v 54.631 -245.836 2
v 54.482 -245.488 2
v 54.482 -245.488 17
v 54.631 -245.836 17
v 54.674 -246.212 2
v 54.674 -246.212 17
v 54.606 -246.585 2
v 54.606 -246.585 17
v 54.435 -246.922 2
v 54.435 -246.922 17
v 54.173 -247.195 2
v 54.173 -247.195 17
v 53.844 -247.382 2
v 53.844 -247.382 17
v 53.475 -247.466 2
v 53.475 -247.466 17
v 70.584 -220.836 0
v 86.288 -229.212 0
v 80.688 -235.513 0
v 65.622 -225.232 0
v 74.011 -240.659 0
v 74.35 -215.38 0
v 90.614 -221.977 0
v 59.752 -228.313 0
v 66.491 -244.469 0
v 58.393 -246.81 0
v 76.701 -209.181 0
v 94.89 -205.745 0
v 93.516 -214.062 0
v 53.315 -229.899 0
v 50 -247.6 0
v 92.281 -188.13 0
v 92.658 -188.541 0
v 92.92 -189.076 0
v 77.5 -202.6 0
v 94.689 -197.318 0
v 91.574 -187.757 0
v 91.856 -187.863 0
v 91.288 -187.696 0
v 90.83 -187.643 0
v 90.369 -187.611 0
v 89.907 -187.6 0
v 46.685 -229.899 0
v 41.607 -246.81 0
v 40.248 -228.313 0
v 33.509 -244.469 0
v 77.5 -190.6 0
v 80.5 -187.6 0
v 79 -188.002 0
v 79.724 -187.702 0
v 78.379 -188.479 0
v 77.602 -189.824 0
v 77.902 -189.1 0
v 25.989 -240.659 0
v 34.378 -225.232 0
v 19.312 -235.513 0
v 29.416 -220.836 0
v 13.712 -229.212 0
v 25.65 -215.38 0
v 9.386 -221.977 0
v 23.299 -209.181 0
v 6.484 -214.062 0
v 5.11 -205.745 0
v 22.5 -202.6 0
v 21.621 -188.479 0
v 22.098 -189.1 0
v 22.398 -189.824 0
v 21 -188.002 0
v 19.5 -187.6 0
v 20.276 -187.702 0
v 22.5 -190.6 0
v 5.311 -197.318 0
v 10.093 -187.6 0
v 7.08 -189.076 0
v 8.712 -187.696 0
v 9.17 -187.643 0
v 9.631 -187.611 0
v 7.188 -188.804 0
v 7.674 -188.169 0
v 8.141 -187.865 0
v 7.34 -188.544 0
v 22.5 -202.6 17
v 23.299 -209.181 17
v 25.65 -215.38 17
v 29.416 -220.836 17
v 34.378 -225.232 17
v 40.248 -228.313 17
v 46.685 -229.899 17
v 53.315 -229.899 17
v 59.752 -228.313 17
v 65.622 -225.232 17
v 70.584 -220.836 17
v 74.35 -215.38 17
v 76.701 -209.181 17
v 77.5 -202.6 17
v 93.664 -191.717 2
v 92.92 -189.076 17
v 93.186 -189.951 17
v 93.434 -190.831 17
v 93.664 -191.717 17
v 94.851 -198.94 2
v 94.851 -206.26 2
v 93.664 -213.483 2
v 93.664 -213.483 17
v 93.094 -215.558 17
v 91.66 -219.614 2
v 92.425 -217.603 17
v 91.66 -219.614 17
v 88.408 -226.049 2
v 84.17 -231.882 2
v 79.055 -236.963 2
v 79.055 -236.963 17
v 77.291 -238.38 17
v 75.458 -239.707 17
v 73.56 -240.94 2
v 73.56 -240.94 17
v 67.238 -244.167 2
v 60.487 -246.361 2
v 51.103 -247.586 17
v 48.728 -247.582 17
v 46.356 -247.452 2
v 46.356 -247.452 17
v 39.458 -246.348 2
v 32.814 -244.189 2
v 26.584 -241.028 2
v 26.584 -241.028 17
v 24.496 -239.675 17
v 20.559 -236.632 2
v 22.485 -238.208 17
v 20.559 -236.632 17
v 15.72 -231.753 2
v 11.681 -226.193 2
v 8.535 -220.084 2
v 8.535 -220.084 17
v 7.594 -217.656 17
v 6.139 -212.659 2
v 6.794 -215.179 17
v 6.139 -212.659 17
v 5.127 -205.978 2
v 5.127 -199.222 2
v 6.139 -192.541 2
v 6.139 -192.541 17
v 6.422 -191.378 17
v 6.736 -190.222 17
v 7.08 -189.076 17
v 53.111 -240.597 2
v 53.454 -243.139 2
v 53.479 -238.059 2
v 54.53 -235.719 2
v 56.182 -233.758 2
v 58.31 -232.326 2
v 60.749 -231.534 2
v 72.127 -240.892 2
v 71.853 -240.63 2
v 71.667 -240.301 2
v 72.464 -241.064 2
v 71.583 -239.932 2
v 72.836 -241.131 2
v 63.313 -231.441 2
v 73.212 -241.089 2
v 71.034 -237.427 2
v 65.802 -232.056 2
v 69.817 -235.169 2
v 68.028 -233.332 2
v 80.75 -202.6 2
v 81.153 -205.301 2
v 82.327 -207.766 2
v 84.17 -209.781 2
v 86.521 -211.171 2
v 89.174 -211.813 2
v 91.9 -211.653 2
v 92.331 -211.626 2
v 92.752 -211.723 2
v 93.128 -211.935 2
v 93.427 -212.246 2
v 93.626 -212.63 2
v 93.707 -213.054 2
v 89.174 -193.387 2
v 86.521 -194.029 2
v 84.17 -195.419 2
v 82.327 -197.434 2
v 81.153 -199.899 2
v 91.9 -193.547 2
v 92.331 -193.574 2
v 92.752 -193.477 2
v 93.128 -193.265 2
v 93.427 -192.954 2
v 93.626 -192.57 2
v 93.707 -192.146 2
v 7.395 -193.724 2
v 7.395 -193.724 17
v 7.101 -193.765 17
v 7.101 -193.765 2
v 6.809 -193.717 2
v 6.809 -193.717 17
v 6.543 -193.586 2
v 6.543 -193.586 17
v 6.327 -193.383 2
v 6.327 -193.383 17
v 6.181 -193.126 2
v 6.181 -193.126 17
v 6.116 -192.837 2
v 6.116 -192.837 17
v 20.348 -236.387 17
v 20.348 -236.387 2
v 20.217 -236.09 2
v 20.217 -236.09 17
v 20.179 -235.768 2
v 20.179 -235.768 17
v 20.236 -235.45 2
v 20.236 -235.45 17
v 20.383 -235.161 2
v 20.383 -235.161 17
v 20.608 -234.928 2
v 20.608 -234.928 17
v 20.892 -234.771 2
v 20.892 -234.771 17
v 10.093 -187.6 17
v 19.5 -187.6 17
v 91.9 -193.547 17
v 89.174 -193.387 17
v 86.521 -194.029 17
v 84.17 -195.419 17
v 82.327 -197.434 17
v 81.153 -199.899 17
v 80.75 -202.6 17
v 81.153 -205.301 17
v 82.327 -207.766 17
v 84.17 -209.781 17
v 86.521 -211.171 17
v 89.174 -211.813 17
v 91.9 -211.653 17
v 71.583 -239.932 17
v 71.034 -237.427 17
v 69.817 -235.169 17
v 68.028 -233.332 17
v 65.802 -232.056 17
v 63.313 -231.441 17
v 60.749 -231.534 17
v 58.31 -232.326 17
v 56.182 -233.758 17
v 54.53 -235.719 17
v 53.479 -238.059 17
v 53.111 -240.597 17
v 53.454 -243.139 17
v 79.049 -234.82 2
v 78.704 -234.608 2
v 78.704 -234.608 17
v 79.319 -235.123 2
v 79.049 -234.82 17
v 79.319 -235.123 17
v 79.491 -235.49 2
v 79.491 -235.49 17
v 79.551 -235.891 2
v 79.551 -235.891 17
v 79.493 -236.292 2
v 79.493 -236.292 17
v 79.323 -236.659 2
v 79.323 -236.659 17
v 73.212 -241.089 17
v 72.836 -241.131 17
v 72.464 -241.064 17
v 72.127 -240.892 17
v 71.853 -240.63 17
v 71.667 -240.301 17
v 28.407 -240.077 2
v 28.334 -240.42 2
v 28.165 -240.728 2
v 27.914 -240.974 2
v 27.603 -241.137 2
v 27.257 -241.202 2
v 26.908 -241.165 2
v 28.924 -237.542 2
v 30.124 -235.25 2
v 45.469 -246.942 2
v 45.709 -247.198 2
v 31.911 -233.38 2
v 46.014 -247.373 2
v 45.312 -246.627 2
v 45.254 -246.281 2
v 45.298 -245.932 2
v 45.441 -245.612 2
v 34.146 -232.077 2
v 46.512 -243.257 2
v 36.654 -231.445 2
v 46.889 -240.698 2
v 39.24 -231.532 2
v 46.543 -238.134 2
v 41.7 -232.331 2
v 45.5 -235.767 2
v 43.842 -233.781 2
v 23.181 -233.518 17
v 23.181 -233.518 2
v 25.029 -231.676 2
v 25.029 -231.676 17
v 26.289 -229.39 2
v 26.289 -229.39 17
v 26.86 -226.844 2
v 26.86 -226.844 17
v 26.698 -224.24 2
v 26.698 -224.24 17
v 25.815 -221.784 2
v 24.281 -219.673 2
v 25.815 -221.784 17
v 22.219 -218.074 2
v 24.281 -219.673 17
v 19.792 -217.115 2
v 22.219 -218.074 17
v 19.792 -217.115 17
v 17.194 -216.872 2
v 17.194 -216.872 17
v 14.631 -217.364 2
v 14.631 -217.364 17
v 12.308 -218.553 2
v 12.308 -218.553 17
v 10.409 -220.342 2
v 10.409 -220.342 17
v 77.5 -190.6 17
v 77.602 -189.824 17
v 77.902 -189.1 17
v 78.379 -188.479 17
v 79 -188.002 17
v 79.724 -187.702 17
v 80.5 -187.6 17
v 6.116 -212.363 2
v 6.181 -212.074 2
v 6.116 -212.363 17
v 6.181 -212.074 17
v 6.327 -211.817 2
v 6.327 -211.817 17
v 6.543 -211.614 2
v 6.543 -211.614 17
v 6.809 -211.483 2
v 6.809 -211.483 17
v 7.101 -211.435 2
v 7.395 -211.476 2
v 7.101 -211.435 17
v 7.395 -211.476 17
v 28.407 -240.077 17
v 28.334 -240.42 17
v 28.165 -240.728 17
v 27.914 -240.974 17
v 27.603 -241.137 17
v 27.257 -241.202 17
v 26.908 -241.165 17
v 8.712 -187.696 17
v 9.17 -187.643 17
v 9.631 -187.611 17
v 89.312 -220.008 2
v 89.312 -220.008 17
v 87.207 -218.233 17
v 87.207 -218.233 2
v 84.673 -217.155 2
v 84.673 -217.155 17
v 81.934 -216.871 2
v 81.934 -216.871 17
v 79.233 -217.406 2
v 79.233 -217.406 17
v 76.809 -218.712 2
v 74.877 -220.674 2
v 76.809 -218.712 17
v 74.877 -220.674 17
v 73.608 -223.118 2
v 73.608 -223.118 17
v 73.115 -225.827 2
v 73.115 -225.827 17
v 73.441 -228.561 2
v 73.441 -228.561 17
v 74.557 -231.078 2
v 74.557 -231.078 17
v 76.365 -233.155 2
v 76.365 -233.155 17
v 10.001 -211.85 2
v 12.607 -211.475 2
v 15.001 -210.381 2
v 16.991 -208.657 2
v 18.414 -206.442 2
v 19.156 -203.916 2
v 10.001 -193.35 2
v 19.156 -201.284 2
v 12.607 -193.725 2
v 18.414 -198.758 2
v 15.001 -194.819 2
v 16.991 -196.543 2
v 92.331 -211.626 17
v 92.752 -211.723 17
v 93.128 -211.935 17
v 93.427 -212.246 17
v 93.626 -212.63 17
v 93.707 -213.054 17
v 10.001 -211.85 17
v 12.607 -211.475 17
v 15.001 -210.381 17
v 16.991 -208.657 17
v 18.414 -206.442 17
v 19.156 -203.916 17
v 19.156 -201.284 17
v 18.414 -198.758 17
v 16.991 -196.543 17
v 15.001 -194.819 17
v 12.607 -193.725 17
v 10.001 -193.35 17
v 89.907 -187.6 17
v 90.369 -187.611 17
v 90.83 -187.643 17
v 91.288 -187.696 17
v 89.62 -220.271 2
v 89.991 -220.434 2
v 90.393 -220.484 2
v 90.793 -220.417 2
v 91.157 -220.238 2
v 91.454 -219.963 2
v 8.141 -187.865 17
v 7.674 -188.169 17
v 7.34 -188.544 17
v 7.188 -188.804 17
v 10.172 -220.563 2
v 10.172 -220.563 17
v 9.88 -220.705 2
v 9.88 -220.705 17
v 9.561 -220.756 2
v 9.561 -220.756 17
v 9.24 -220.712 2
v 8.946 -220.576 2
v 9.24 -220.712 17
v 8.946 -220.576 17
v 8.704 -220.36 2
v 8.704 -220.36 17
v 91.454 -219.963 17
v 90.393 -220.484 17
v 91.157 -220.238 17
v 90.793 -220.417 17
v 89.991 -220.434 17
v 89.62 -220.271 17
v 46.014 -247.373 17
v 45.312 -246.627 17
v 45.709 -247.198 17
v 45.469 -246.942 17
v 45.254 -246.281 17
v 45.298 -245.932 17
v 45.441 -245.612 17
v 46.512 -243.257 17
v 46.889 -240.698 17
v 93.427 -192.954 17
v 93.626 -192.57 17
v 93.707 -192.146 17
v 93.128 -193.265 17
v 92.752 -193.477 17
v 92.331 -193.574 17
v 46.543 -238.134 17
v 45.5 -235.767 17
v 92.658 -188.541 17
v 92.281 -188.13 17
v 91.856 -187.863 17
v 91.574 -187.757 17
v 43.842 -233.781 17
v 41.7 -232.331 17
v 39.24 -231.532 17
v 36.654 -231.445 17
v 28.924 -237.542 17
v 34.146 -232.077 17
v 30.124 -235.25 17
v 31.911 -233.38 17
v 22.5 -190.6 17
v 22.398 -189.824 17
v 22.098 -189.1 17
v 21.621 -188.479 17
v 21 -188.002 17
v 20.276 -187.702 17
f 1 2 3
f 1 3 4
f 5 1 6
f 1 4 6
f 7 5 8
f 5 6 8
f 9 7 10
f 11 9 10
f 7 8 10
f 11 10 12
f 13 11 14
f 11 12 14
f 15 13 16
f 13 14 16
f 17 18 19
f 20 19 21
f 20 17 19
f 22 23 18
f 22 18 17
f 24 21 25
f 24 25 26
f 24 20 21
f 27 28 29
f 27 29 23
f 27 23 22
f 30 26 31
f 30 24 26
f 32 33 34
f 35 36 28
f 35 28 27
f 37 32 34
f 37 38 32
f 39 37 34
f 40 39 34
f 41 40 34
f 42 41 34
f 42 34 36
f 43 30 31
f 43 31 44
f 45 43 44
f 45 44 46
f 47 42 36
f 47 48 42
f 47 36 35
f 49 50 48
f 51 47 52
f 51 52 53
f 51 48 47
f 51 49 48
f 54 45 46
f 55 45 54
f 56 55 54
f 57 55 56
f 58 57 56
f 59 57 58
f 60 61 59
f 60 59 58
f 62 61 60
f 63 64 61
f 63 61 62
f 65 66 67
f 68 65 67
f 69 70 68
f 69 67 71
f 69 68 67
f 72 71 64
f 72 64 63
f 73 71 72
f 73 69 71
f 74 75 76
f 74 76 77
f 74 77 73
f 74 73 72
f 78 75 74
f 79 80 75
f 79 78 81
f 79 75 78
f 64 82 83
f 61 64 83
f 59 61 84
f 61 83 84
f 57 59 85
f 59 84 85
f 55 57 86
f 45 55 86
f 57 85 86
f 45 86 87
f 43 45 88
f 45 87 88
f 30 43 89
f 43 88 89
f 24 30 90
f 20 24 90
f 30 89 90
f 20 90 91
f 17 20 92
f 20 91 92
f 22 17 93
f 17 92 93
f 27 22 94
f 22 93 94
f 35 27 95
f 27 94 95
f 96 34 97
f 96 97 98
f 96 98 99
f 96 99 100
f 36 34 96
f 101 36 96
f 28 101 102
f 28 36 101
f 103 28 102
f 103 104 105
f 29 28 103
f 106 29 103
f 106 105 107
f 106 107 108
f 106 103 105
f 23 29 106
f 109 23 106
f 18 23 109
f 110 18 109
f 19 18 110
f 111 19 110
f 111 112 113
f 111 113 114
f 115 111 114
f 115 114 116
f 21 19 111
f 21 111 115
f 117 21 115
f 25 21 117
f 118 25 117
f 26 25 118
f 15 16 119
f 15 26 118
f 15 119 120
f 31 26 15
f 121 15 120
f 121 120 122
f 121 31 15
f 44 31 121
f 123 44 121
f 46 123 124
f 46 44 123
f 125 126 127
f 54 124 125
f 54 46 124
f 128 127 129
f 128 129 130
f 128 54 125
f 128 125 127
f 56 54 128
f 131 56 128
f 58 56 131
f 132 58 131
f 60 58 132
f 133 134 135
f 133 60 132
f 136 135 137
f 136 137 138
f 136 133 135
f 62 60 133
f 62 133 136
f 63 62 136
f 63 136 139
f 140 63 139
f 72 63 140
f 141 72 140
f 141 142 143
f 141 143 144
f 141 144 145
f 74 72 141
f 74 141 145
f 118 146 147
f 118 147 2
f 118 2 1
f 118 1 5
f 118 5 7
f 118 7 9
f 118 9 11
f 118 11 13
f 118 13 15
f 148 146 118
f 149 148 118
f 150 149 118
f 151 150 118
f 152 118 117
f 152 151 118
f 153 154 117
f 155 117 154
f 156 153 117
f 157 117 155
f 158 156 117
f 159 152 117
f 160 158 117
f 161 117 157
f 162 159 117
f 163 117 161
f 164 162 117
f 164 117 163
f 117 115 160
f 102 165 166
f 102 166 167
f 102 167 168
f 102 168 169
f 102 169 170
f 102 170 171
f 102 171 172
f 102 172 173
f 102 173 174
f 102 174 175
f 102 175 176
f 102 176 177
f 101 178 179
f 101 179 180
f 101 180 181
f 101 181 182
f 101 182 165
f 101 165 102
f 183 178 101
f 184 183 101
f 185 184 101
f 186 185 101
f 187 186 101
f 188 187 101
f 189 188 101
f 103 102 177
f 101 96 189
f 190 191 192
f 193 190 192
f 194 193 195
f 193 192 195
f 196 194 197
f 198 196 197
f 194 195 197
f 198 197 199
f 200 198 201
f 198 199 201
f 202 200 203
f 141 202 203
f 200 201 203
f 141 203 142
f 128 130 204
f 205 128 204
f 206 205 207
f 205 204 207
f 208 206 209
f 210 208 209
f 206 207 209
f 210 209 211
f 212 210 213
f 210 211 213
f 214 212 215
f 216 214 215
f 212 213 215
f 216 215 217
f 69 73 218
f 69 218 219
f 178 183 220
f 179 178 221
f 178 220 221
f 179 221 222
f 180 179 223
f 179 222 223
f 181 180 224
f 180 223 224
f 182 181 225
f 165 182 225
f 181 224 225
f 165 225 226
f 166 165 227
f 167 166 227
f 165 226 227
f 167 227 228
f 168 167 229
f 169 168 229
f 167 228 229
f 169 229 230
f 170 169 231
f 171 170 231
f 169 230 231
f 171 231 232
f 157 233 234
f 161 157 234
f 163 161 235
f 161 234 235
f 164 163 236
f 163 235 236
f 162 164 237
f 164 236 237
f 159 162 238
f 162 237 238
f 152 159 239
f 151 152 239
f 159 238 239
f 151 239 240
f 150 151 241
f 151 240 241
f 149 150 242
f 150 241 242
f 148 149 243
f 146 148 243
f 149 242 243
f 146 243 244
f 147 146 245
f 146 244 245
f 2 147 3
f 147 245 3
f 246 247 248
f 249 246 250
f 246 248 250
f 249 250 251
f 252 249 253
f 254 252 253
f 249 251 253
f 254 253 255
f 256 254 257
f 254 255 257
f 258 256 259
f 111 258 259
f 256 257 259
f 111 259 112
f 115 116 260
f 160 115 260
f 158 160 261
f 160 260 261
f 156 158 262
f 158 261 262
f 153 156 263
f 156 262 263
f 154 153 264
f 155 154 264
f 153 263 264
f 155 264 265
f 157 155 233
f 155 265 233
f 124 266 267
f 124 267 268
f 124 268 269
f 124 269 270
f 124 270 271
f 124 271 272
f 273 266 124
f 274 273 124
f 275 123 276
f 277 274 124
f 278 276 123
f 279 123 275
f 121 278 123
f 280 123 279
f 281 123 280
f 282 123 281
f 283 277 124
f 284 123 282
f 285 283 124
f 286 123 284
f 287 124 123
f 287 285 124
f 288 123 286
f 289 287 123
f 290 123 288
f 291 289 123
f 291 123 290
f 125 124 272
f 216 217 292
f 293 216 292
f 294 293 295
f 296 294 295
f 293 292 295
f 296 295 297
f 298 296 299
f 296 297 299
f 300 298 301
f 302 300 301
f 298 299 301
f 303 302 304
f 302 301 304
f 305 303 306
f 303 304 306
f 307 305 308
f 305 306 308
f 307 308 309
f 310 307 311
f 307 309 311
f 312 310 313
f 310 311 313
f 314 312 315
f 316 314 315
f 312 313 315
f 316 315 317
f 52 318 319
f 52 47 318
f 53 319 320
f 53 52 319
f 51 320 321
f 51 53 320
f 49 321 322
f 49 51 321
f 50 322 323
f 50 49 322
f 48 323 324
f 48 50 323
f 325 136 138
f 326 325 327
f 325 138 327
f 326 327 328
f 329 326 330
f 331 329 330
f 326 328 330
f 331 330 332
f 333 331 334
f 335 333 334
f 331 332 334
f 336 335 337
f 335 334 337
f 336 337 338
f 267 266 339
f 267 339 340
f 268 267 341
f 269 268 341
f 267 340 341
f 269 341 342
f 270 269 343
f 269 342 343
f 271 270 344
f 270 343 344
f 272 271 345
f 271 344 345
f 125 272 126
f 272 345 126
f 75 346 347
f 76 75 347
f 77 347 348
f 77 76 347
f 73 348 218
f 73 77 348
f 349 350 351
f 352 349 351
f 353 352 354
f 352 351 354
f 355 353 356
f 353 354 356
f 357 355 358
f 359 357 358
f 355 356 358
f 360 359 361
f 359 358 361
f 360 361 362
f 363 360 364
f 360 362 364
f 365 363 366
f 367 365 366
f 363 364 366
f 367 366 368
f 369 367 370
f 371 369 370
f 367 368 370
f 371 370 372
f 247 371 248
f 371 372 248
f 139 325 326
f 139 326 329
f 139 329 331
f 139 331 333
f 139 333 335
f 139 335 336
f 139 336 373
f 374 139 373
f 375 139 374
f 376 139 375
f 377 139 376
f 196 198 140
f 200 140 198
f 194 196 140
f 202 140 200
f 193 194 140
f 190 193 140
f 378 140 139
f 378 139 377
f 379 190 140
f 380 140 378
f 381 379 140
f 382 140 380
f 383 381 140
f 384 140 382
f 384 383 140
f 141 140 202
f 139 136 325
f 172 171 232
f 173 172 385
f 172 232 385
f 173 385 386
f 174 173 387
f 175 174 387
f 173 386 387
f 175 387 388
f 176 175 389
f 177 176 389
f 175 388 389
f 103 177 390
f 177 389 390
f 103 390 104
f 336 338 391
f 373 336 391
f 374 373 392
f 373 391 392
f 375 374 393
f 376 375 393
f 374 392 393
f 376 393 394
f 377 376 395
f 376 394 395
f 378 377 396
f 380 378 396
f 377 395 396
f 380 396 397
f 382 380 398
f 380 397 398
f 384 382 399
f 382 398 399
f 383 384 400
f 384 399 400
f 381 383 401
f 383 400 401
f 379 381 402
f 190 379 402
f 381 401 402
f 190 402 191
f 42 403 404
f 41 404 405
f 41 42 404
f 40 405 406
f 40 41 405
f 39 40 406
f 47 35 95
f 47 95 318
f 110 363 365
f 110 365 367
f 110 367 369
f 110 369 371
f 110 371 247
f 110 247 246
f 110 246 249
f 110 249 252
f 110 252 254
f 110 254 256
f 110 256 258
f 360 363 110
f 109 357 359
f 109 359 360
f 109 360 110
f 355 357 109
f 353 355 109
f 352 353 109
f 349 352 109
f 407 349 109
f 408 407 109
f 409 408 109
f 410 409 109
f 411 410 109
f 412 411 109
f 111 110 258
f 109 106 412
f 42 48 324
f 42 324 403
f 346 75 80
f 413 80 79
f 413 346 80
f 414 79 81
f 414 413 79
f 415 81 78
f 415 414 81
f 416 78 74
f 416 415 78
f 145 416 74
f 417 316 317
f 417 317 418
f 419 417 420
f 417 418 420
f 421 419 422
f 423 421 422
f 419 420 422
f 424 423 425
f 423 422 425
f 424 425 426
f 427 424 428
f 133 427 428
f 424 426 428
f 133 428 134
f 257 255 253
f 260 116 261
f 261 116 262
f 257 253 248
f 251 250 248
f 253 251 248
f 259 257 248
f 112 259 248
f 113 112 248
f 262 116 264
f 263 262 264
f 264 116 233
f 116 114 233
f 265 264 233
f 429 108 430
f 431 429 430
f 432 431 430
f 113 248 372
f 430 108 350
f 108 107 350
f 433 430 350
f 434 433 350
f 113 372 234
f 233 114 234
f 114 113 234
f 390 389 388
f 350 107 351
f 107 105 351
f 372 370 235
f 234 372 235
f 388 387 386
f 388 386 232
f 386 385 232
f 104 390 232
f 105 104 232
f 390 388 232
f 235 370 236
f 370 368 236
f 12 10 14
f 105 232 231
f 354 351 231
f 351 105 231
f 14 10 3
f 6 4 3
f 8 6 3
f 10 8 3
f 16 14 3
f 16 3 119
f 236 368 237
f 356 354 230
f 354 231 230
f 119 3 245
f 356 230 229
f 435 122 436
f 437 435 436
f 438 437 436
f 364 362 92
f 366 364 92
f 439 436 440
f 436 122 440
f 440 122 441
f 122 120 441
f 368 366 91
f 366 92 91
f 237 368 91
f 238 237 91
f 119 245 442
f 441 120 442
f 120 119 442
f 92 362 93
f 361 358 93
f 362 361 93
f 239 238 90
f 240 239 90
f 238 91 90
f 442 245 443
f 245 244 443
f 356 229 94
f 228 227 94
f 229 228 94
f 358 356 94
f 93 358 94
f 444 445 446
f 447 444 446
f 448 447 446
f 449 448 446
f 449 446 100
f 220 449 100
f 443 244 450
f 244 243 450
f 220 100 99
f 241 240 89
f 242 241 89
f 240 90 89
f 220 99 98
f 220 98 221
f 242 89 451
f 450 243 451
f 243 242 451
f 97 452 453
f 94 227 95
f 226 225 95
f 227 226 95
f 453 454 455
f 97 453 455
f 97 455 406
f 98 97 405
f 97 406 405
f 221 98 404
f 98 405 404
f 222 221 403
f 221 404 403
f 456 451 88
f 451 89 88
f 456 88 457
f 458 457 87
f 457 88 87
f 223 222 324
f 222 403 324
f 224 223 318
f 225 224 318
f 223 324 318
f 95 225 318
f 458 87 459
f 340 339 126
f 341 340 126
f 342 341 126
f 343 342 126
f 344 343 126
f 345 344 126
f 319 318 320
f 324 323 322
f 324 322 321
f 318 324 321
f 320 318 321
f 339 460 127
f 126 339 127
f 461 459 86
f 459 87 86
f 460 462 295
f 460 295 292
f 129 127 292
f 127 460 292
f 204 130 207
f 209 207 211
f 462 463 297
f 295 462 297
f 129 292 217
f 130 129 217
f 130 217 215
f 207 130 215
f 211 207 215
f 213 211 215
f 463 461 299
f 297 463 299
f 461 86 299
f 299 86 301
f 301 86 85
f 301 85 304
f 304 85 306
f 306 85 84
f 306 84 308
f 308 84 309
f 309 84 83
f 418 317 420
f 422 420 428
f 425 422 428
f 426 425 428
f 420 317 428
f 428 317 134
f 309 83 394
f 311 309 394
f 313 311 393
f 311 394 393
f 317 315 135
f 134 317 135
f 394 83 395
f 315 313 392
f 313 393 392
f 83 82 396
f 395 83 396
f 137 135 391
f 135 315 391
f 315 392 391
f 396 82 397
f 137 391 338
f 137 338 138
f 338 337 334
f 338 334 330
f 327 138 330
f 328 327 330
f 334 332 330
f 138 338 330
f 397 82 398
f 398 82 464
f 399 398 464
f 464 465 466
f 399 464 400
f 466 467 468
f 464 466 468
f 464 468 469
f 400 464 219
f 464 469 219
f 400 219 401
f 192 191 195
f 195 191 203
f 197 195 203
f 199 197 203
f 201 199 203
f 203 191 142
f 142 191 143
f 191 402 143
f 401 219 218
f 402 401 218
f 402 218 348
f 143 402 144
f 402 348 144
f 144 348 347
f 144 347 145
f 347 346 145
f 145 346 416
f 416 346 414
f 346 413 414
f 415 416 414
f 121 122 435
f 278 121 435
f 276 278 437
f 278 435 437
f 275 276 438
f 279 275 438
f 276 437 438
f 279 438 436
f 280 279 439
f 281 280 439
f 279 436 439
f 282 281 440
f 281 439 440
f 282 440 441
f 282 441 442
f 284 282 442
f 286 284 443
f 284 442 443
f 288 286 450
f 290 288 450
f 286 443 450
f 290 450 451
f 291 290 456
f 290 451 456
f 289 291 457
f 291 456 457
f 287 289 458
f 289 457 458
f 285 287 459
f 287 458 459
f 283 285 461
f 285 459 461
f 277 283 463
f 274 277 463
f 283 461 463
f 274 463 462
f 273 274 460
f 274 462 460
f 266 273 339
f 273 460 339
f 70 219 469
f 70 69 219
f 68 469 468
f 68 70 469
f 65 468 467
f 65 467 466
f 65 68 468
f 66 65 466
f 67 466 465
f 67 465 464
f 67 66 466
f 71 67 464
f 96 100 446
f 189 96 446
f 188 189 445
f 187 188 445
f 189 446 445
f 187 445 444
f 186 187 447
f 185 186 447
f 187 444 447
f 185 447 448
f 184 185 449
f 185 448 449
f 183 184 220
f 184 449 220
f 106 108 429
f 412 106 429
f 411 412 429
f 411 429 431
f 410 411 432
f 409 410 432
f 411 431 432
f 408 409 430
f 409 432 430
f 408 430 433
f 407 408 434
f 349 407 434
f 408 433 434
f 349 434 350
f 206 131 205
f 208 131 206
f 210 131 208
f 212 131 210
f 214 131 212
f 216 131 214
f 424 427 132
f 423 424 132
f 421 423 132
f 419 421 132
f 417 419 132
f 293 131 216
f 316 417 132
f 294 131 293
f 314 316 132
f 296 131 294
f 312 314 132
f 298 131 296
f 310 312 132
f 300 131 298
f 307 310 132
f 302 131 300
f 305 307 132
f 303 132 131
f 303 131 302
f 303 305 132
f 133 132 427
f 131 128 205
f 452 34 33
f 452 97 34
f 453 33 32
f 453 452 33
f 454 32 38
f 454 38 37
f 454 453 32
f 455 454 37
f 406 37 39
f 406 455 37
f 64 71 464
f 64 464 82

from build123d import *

# Parameters (mm, degrees)
EXTRUDE_1_DEPTH     = 17
CUT_EXTRUDE_1_DEPTH = 15
CUT_EXTRUDE_2_DEPTH = 15
CUT_EXTRUDE_3_DEPTH = 15
CUT_EXTRUDE_4_DEPTH = 15
CUT_EXTRUDE_5_DEPTH = 15
CUT_EXTRUDE_6_DEPTH = 15
CUT_EXTRUDE_7_DEPTH = 18
FILLET_1_R          = 2
FILLET_2_R          = 3


with BuildPart() as part:
    # 草图1 → 凸台-拉伸1 (new body)
    with BuildSketch(Plane(origin=(0, 0, 0), x_dir=(-1, 0, 0), z_dir=(0, 0, -1))):
        with BuildLine():
            Line((-10.093009514, -187.6), (-89.906992274, -187.6))
            ThreePointArc((-89.906992274, -187.6), (-91.240663452, -187.689332959), (-92.550506472, -187.955735762))
            ThreePointArc((-92.550506472, -187.955735762), (-50.000000894, -247.6), (-7.449495316, -187.955735762))
            ThreePointArc((-7.449495316, -187.955735762), (-8.759338336, -187.689332959), (-10.093009514, -187.6))
        make_face()
    extrude(amount=-EXTRUDE_1_DEPTH)

    # 草图2 → 切除-拉伸1 (cut)
    with BuildSketch(Plane.XY.offset(17)):
        with BuildLine():
            ThreePointArc((6.138583991, -212.658633467), (6.427726824, -211.707087742), (7.394913242, -211.47558552))
            ThreePointArc((7.394913242, -211.47558552), (19.250000894, -202.6), (7.394913242, -193.72441448))
            ThreePointArc((7.394913242, -193.72441448), (6.427726824, -193.492912258), (6.138583991, -192.541366533))
            ThreePointArc((6.138583991, -192.541366533), (5.000000894, -202.6), (6.138583991, -212.658633467))
        make_face()
    extrude(amount=-CUT_EXTRUDE_1_DEPTH, mode=Mode.SUBTRACT)

    # 草图3 → 切除-拉伸2 (cut)
    with BuildSketch(Plane.XY.offset(17)):
        with BuildLine():
            ThreePointArc((20.558692873, -236.632475402), (20.195546949, -235.606932185), (20.891610548, -234.770804613))
            ThreePointArc((20.891610548, -234.770804613), (25.122728317, -220.674396508), (10.408760237, -220.342398969))
            ThreePointArc((10.408760237, -220.342398969), (9.398460179, -220.746017161), (8.535328882, -220.083734582))
            ThreePointArc((8.535328882, -220.083734582), (13.594236147, -229.050336353), (20.558692873, -236.632475402))
        make_face()
    extrude(amount=-CUT_EXTRUDE_2_DEPTH, mode=Mode.SUBTRACT)

    # 草图4 → 切除-拉伸3 (cut)
    with BuildSketch(Plane.XY.offset(17)):
        with BuildLine():
            ThreePointArc((46.35614853, -247.452227815), (45.378748434, -246.7903036), (45.441184322, -245.611509143))
            ThreePointArc((45.441184322, -245.611509143), (40.497728317, -231.844987876), (28.406630222, -240.076646999))
            ThreePointArc((28.406630222, -240.076646999), (27.764263919, -241.067010643), (26.584461339, -241.028017219))
            ThreePointArc((26.584461339, -241.028017219), (36.094236147, -245.397543233), (46.35614853, -247.452227815))
        make_face()
    extrude(amount=-CUT_EXTRUDE_3_DEPTH, mode=Mode.SUBTRACT)

    # 草图5 → 切除-拉伸4 (cut)
    with BuildSketch(Plane.XY.offset(17)):
        with BuildLine():
            ThreePointArc((73.560141987, -240.939532492), (72.289088744, -240.990132521), (71.583355923, -239.931795197))
            ThreePointArc((71.583355923, -239.931795197), (59.502273471, -231.844987876), (54.481778538, -245.488434526))
            ThreePointArc((54.481778538, -245.488434526), (54.532903764, -246.759466752), (53.474858139, -247.465636818))
            ThreePointArc((53.474858139, -247.465636818), (63.905765641, -245.397543233), (73.560141987, -240.939532492))
        make_face()
    extrude(amount=-CUT_EXTRUDE_4_DEPTH, mode=Mode.SUBTRACT)

    # 草图6 → 切除-拉伸5 (cut)
    with BuildSketch(Plane.XY.offset(17)):
        with BuildLine():
            ThreePointArc((91.659654246, -219.613914382), (90.59547429, -220.46525304), (89.311552324, -220.008305698))
            ThreePointArc((89.311552324, -220.008305698), (74.877273471, -220.674396508), (78.704220933, -234.608044849))
            ThreePointArc((78.704220933, -234.608044849), (79.535557387, -235.687922708), (79.0547359, -236.963096102))
            ThreePointArc((79.0547359, -236.963096102), (86.405765641, -229.050336353), (91.659654246, -219.613914382))
        make_face()
    extrude(amount=-CUT_EXTRUDE_5_DEPTH, mode=Mode.SUBTRACT)

    # 草图7 → 切除-拉伸6 (cut)
    with BuildSketch(Plane.XY.offset(17)):
        with BuildLine():
            ThreePointArc((93.664063394, -191.716542553), (93.288877928, -193.119991574), (91.900418772, -193.547325705))
            ThreePointArc((91.900418772, -193.547325705), (80.750000894, -202.6), (91.900418772, -211.652674295))
            ThreePointArc((91.900418772, -211.652674295), (93.288877928, -212.080008426), (93.664063394, -213.483457447))
            ThreePointArc((93.664063394, -213.483457447), (95.000000894, -202.6), (93.664063394, -191.716542553))
        make_face()
    extrude(amount=-CUT_EXTRUDE_6_DEPTH, mode=Mode.SUBTRACT)

    # 草图8 → 切除-拉伸7 (cut, through all)
    with BuildSketch(Plane.XY.offset(17)):
        with BuildLine():
            Line((77.500000894, -187.6), (22.500000894, -187.6))
            Line((22.500000894, -187.6), (22.500000894, -202.6))
            ThreePointArc((22.500000894, -202.6), (50.000000894, -230.1), (77.500000894, -202.6))
            Line((77.500000894, -202.6), (77.500000894, -187.6))
        make_face()
    extrude(amount=-CUT_EXTRUDE_7_DEPTH, mode=Mode.SUBTRACT)

    # 圆角1
    fillet_1_edges = [part.edges().sort_by_distance(p)[0] for p in [
        (92.550506472, -187.955735762, 8.5),
        (7.449495316, -187.955735762, 8.5),
    ]]
    fillet(fillet_1_edges, radius=FILLET_1_R)

    # 圆角2
    fillet_2_edges = [part.edges().sort_by_distance(p)[0] for p in [
        (77.500000894, -187.6, 8.5),
        (22.500000894, -187.6, 8.5),
    ]]
    fillet(fillet_2_edges, radius=FILLET_2_R)


solid = part.part
